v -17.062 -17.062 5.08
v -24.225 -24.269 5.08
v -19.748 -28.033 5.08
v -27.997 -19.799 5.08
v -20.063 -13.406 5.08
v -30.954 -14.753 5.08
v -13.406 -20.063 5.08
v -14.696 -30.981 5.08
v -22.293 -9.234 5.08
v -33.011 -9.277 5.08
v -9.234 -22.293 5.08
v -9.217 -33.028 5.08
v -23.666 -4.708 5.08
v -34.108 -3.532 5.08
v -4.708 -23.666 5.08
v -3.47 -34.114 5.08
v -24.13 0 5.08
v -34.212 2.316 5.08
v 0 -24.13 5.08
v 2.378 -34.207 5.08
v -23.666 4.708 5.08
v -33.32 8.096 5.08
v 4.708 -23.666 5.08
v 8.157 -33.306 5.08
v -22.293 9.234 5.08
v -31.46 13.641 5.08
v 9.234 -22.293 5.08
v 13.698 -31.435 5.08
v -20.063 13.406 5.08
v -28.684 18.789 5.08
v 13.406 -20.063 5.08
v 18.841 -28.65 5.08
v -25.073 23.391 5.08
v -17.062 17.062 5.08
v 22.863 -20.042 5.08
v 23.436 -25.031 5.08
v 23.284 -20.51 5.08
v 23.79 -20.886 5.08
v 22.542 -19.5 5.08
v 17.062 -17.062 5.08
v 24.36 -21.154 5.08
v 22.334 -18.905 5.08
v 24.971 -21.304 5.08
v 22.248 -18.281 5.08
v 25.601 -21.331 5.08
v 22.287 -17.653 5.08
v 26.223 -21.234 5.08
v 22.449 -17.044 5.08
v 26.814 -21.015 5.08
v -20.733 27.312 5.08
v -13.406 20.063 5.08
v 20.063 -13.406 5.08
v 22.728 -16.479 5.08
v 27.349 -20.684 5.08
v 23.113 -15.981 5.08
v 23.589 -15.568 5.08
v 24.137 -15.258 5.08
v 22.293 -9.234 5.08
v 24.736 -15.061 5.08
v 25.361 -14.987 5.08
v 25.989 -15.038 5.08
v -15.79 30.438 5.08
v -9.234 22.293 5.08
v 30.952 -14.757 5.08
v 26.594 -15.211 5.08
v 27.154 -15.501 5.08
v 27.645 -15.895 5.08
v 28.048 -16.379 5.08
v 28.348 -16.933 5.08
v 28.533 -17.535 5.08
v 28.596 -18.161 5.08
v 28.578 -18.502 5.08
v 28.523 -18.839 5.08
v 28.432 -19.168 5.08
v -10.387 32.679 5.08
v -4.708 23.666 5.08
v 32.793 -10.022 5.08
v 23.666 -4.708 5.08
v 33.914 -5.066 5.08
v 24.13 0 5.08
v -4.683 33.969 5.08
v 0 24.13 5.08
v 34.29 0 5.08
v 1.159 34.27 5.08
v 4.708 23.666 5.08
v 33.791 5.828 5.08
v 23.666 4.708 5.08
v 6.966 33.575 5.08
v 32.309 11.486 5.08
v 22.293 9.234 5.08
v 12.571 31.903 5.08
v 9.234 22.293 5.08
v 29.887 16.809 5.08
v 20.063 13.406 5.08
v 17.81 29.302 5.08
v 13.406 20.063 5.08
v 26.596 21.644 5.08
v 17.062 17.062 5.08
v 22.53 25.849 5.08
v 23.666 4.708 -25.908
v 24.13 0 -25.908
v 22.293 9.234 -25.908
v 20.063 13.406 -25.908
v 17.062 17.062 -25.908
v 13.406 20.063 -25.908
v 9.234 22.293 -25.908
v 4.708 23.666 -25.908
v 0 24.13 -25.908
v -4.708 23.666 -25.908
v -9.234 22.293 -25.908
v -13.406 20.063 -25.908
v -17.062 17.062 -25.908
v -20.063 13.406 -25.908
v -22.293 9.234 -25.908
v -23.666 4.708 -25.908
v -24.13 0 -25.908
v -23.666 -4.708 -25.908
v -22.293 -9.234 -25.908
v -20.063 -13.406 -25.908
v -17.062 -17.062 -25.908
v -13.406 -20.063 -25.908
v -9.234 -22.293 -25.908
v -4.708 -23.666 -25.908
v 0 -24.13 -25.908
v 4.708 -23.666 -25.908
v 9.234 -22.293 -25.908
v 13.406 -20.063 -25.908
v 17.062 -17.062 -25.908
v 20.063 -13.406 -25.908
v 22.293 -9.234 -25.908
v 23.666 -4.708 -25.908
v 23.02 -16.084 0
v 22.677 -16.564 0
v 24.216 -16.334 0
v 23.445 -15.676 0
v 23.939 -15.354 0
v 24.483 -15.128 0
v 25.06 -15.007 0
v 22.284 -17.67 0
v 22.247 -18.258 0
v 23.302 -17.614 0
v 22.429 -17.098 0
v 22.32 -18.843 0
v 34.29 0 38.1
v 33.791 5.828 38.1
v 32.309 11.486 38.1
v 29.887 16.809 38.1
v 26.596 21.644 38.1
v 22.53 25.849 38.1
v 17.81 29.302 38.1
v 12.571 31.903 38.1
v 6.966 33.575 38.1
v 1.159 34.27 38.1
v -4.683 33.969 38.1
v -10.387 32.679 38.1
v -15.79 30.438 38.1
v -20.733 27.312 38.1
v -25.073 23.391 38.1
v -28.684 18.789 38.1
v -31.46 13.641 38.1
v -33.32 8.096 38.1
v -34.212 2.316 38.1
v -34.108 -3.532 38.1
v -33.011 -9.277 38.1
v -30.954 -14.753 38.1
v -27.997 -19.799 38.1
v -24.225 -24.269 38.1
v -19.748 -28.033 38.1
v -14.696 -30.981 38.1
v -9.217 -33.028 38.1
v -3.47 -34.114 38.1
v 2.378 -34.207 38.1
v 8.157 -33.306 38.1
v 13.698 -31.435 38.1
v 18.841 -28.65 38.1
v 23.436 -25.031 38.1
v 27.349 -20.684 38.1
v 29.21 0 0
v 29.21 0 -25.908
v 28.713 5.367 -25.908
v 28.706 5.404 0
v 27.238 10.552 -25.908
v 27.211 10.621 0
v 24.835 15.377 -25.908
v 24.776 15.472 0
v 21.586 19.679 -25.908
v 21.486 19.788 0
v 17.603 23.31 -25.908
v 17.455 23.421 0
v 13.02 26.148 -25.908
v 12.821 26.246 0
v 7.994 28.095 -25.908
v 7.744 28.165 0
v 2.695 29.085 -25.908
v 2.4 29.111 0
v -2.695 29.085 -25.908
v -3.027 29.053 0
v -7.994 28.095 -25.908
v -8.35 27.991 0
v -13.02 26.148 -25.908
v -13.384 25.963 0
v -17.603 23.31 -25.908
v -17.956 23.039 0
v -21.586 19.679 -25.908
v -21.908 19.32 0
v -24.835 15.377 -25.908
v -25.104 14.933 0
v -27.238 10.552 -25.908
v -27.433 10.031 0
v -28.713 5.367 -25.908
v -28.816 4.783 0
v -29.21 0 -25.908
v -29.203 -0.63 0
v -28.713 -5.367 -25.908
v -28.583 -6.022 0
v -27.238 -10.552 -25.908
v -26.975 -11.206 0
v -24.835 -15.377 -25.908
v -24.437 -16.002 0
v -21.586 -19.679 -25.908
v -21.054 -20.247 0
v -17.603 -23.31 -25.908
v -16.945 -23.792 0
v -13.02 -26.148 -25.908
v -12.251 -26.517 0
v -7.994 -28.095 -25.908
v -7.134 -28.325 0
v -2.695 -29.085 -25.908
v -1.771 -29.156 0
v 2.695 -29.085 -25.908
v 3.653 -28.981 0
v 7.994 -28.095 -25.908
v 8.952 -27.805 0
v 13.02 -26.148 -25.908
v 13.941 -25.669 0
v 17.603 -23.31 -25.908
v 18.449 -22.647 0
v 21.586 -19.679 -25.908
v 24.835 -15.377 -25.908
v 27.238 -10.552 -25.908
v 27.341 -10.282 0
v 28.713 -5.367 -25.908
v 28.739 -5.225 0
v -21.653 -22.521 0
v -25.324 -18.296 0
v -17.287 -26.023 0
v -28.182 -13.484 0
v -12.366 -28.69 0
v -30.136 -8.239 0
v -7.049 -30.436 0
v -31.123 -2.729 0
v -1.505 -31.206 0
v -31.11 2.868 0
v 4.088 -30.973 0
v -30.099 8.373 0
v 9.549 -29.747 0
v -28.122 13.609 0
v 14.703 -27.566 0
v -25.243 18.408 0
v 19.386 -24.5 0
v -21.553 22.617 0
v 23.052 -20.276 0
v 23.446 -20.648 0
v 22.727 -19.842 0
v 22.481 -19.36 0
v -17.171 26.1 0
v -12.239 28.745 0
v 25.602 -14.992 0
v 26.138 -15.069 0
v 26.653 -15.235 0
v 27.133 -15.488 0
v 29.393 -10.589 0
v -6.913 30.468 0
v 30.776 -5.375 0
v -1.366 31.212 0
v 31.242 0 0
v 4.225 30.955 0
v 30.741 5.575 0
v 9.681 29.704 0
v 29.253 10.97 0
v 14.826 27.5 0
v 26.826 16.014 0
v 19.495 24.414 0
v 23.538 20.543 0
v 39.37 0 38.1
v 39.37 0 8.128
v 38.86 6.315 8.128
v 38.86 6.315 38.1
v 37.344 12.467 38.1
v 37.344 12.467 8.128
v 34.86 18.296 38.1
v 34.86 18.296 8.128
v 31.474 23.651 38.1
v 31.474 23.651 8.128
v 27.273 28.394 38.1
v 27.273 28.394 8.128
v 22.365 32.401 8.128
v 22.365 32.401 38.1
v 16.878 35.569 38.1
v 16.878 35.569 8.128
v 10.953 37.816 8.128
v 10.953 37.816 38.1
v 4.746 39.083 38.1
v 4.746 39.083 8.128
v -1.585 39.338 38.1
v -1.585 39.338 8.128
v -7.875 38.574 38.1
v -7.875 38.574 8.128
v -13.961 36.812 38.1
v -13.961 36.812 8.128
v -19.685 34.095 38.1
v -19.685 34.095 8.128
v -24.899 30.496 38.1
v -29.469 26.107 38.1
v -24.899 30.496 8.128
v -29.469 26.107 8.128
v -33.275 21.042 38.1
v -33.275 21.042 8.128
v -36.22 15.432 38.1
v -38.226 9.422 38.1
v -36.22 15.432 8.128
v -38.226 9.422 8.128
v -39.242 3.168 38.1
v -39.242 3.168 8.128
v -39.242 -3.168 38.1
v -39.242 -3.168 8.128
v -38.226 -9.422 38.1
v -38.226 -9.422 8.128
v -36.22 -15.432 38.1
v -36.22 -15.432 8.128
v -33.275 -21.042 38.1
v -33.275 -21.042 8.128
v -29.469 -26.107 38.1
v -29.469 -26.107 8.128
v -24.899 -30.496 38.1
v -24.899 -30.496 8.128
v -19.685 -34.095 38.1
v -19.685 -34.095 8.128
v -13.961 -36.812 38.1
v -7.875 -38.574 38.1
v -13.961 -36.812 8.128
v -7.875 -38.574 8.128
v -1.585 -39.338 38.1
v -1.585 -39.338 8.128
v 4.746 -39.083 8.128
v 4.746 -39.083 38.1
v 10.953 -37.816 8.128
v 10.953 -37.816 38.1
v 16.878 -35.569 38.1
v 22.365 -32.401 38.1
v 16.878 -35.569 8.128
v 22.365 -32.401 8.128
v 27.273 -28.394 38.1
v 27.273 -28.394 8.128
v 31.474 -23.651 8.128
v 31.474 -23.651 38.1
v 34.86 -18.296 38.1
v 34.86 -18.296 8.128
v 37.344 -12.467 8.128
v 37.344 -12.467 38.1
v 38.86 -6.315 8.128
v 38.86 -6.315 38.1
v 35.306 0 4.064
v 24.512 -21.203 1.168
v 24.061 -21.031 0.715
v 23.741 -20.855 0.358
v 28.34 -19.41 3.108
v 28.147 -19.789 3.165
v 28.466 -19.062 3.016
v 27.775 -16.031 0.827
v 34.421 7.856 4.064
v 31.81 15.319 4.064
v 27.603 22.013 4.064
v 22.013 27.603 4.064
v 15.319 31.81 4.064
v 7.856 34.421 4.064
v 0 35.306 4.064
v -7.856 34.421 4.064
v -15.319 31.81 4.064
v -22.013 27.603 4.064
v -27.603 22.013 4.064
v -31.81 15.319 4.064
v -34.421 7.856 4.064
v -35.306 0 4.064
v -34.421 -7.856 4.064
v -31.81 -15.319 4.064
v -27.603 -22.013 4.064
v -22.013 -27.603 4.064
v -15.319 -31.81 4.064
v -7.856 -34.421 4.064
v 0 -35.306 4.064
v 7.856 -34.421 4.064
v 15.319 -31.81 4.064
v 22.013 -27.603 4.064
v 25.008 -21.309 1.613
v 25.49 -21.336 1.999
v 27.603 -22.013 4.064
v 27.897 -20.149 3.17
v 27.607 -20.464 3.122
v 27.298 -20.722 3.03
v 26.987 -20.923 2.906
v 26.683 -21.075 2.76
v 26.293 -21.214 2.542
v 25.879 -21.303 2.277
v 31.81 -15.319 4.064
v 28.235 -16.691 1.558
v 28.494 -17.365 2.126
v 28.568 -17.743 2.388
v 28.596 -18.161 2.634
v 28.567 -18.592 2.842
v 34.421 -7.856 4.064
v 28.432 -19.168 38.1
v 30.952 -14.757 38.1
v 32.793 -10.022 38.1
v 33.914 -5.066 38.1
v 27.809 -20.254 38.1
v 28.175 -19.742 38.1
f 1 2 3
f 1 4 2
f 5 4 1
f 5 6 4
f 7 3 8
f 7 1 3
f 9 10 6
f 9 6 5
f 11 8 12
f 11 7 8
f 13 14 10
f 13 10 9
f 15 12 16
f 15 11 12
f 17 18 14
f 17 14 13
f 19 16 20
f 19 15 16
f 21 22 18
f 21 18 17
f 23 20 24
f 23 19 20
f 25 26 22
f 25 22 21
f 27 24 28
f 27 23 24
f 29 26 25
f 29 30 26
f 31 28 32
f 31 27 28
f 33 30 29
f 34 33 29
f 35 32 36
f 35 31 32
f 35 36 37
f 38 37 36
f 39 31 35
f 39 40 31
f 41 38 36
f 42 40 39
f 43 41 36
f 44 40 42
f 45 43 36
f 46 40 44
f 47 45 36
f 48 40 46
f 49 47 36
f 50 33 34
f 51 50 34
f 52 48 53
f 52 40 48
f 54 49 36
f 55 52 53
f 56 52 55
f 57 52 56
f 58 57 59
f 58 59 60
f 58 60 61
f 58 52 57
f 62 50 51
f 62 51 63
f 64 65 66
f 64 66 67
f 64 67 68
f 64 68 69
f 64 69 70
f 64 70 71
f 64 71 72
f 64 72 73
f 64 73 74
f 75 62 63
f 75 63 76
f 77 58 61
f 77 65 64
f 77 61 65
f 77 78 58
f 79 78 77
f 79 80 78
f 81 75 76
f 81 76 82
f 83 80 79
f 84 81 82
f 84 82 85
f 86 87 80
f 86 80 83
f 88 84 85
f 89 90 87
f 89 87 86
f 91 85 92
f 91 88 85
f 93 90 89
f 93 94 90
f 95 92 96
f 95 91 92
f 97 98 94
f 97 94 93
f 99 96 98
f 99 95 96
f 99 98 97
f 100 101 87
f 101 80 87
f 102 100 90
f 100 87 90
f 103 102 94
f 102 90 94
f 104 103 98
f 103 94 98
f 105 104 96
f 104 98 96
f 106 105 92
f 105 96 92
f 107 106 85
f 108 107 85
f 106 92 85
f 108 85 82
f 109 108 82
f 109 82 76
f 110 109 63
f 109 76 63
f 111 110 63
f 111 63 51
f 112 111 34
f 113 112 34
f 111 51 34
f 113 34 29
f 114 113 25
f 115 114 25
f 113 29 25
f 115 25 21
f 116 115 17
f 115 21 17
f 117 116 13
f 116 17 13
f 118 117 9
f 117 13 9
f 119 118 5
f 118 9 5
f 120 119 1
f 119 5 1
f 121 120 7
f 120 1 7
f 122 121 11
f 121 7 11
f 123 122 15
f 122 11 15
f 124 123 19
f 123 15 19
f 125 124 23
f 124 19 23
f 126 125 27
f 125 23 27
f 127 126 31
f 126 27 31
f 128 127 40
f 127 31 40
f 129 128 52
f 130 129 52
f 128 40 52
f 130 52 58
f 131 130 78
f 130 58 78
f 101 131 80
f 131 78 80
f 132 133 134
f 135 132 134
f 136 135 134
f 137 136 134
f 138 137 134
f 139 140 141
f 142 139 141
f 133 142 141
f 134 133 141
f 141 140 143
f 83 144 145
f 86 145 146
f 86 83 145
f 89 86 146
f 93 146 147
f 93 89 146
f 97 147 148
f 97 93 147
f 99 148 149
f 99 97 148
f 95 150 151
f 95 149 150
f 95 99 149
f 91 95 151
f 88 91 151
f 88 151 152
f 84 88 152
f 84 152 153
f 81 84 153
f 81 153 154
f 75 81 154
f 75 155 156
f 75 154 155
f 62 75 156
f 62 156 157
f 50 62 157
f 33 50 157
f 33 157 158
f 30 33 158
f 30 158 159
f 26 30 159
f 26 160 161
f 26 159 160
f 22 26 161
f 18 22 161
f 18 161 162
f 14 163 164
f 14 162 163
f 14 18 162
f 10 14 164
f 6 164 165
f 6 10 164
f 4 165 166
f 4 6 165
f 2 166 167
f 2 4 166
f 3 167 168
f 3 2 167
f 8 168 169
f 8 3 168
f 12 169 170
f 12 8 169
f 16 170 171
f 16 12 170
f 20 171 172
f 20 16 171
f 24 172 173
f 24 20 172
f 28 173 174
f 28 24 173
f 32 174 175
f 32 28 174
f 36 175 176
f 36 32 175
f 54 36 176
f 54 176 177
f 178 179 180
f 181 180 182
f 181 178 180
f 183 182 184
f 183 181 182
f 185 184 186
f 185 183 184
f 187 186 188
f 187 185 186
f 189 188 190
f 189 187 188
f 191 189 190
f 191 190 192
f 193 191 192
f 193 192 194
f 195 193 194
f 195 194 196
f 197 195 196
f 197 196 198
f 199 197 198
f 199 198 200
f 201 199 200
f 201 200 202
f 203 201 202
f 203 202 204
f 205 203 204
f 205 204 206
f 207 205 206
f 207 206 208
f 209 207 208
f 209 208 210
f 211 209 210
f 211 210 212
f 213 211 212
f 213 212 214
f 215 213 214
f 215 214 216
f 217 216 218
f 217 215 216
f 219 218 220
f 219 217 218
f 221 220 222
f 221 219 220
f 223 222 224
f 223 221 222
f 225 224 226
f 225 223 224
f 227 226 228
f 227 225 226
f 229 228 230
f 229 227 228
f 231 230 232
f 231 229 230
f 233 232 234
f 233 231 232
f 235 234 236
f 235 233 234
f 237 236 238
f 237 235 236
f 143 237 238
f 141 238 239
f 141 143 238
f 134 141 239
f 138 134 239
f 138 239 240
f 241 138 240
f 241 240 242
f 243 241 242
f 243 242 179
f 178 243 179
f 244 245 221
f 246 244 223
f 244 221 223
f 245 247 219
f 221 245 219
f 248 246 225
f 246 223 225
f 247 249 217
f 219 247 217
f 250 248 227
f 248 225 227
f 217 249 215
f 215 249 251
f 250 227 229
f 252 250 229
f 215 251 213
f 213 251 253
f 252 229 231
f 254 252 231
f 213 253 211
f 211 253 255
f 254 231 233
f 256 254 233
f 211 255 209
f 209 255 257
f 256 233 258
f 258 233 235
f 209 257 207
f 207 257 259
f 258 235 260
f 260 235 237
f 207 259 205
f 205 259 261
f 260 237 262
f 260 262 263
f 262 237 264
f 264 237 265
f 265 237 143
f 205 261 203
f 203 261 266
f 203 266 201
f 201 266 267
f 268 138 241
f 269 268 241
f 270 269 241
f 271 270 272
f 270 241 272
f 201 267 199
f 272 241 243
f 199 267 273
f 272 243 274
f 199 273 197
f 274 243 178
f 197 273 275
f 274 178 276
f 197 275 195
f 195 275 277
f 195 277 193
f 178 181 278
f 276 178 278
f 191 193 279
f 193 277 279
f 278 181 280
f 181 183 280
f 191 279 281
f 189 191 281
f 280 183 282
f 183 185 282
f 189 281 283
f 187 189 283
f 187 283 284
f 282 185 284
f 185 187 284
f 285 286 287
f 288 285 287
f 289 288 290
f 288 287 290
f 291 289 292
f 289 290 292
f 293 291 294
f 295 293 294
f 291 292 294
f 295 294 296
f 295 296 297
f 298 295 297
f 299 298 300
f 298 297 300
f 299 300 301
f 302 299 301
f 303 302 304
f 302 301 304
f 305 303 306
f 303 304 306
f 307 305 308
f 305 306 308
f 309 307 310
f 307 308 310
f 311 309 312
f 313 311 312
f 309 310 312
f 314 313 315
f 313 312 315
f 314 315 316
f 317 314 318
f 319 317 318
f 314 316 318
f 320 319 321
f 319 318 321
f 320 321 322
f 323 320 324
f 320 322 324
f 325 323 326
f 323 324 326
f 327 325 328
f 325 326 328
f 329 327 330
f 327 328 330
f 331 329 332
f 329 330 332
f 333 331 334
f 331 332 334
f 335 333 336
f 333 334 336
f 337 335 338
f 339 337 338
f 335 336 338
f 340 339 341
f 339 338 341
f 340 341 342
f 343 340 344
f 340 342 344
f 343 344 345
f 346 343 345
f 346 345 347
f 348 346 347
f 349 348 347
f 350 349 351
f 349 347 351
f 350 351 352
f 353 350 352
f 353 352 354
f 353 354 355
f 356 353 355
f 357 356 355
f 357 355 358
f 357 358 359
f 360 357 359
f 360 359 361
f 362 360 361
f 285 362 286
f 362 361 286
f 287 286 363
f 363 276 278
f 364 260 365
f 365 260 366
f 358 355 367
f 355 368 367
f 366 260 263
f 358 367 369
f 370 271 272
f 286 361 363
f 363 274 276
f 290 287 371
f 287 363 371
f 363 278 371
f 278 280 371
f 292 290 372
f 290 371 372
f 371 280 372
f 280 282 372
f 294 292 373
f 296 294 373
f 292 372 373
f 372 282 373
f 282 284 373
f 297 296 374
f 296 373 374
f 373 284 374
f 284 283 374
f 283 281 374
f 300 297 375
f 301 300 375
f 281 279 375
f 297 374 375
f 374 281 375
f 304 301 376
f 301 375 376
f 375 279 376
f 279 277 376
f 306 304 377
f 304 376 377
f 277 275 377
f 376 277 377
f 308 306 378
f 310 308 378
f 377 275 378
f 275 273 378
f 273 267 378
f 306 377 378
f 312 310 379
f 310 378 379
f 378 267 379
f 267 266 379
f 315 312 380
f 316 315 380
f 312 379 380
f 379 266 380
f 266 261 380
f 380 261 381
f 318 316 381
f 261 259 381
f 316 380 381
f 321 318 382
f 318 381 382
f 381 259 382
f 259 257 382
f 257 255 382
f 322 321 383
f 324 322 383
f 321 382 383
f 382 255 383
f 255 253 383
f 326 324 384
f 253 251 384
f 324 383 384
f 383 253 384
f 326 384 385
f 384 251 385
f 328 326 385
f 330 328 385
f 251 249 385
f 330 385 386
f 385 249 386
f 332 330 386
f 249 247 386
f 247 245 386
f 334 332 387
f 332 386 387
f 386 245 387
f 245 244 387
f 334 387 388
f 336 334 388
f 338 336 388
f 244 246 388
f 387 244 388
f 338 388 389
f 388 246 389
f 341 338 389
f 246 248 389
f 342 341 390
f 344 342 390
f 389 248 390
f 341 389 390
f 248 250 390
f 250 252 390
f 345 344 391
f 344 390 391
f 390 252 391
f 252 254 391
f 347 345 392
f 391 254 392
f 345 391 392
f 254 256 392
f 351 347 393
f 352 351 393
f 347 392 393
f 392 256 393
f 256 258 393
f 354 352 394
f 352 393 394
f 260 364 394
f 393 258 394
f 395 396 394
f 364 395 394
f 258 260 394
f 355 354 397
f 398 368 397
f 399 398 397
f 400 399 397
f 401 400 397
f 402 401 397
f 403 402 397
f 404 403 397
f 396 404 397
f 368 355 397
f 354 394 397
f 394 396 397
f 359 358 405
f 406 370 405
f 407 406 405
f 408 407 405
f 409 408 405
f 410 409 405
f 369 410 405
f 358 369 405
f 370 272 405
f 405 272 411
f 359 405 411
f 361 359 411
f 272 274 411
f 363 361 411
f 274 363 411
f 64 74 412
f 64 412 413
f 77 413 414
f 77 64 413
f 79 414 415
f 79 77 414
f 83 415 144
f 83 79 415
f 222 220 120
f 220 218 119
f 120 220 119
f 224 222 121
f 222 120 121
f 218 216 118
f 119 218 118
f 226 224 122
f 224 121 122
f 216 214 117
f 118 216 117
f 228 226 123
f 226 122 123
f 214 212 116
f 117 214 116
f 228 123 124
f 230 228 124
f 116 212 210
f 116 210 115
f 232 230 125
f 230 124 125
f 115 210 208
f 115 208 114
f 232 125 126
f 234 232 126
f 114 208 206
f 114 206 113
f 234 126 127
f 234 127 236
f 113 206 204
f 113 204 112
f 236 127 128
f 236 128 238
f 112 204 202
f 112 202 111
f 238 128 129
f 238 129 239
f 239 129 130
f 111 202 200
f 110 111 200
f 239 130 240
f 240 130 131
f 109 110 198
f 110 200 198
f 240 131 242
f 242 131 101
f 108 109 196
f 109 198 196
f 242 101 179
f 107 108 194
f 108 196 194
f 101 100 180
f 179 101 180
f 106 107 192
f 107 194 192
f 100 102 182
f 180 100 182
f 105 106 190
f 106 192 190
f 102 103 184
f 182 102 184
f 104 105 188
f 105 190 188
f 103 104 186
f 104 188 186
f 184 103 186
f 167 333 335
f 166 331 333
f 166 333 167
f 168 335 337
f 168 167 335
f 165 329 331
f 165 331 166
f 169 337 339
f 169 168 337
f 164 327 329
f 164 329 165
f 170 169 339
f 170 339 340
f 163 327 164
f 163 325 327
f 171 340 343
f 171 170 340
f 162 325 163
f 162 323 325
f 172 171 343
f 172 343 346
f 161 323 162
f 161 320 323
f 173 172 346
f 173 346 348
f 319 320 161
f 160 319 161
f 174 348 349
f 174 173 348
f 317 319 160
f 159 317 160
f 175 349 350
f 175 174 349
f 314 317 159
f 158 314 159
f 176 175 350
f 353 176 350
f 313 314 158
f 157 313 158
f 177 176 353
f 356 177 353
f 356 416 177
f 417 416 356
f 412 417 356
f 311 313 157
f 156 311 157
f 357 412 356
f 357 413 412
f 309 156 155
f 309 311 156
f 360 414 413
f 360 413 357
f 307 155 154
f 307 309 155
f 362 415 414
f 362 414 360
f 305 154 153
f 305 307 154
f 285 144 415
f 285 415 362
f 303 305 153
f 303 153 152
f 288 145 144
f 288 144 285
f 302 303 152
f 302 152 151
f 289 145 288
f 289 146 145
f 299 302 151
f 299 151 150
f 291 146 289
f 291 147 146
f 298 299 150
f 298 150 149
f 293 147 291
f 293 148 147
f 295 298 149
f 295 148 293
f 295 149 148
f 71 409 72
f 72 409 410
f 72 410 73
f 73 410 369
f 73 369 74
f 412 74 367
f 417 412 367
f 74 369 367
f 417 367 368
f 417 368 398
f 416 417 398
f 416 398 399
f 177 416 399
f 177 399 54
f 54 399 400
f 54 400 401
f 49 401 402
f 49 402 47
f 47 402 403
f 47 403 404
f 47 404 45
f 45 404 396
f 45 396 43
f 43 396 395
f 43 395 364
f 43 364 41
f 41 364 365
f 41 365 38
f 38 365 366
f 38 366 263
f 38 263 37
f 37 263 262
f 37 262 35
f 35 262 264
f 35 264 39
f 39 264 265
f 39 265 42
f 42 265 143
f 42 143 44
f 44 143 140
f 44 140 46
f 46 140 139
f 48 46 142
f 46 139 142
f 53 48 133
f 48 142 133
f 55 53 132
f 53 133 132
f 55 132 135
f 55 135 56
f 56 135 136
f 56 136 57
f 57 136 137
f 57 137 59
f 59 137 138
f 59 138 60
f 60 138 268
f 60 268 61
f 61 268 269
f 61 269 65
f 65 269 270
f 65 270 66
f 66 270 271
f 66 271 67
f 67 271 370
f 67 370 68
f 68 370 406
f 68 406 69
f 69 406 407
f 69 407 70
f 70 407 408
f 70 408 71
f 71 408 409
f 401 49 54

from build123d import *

# Parameters (mm, degrees)
F0_R     = 29.21
F1_DEPTH = 25.908
F2_R     = 39.37
F3_DEPTH = 38.1
F4_T     = -5.08
F5_SIZE  = 8.128
F7_D     = 6.35
F7_DEPTH = 38.101


with BuildPart() as f1:
    # F0 (on Top) → F1 (new body)
    with BuildSketch(Plane.XY):
        Circle(F0_R)
    extrude(amount=-F1_DEPTH)

    # F2 (on Top) → F3 (join)
    with BuildSketch(Plane.XY):
        Circle(F2_R)
    extrude(amount=F3_DEPTH)

    # F4
    f4_openings = [f1.faces().sort_by_distance(p)[0] for p in [
        (0, 0, 38.1),
        (0, 0, -25.908),
    ]]
    offset(amount=F4_T, openings=f4_openings, kind=Kind.INTERSECTION)

    # F5
    f5_edges = [f1.edges().sort_by_distance(p)[0] for p in [
        (-39.37, 0, 0),
    ]]
    chamfer(f5_edges, length=F5_SIZE)

    # F7 (through all, one way)
    with BuildSketch(Plane(origin=(0, 0, 0), x_dir=(1, 0, 0), z_dir=(0, 0, -1))):
        with Locations((25.4209353007, 18.1614595349)):
            Circle(F7_D / 2)
    extrude(amount=-F7_DEPTH, mode=Mode.SUBTRACT)


solid = f1.part
